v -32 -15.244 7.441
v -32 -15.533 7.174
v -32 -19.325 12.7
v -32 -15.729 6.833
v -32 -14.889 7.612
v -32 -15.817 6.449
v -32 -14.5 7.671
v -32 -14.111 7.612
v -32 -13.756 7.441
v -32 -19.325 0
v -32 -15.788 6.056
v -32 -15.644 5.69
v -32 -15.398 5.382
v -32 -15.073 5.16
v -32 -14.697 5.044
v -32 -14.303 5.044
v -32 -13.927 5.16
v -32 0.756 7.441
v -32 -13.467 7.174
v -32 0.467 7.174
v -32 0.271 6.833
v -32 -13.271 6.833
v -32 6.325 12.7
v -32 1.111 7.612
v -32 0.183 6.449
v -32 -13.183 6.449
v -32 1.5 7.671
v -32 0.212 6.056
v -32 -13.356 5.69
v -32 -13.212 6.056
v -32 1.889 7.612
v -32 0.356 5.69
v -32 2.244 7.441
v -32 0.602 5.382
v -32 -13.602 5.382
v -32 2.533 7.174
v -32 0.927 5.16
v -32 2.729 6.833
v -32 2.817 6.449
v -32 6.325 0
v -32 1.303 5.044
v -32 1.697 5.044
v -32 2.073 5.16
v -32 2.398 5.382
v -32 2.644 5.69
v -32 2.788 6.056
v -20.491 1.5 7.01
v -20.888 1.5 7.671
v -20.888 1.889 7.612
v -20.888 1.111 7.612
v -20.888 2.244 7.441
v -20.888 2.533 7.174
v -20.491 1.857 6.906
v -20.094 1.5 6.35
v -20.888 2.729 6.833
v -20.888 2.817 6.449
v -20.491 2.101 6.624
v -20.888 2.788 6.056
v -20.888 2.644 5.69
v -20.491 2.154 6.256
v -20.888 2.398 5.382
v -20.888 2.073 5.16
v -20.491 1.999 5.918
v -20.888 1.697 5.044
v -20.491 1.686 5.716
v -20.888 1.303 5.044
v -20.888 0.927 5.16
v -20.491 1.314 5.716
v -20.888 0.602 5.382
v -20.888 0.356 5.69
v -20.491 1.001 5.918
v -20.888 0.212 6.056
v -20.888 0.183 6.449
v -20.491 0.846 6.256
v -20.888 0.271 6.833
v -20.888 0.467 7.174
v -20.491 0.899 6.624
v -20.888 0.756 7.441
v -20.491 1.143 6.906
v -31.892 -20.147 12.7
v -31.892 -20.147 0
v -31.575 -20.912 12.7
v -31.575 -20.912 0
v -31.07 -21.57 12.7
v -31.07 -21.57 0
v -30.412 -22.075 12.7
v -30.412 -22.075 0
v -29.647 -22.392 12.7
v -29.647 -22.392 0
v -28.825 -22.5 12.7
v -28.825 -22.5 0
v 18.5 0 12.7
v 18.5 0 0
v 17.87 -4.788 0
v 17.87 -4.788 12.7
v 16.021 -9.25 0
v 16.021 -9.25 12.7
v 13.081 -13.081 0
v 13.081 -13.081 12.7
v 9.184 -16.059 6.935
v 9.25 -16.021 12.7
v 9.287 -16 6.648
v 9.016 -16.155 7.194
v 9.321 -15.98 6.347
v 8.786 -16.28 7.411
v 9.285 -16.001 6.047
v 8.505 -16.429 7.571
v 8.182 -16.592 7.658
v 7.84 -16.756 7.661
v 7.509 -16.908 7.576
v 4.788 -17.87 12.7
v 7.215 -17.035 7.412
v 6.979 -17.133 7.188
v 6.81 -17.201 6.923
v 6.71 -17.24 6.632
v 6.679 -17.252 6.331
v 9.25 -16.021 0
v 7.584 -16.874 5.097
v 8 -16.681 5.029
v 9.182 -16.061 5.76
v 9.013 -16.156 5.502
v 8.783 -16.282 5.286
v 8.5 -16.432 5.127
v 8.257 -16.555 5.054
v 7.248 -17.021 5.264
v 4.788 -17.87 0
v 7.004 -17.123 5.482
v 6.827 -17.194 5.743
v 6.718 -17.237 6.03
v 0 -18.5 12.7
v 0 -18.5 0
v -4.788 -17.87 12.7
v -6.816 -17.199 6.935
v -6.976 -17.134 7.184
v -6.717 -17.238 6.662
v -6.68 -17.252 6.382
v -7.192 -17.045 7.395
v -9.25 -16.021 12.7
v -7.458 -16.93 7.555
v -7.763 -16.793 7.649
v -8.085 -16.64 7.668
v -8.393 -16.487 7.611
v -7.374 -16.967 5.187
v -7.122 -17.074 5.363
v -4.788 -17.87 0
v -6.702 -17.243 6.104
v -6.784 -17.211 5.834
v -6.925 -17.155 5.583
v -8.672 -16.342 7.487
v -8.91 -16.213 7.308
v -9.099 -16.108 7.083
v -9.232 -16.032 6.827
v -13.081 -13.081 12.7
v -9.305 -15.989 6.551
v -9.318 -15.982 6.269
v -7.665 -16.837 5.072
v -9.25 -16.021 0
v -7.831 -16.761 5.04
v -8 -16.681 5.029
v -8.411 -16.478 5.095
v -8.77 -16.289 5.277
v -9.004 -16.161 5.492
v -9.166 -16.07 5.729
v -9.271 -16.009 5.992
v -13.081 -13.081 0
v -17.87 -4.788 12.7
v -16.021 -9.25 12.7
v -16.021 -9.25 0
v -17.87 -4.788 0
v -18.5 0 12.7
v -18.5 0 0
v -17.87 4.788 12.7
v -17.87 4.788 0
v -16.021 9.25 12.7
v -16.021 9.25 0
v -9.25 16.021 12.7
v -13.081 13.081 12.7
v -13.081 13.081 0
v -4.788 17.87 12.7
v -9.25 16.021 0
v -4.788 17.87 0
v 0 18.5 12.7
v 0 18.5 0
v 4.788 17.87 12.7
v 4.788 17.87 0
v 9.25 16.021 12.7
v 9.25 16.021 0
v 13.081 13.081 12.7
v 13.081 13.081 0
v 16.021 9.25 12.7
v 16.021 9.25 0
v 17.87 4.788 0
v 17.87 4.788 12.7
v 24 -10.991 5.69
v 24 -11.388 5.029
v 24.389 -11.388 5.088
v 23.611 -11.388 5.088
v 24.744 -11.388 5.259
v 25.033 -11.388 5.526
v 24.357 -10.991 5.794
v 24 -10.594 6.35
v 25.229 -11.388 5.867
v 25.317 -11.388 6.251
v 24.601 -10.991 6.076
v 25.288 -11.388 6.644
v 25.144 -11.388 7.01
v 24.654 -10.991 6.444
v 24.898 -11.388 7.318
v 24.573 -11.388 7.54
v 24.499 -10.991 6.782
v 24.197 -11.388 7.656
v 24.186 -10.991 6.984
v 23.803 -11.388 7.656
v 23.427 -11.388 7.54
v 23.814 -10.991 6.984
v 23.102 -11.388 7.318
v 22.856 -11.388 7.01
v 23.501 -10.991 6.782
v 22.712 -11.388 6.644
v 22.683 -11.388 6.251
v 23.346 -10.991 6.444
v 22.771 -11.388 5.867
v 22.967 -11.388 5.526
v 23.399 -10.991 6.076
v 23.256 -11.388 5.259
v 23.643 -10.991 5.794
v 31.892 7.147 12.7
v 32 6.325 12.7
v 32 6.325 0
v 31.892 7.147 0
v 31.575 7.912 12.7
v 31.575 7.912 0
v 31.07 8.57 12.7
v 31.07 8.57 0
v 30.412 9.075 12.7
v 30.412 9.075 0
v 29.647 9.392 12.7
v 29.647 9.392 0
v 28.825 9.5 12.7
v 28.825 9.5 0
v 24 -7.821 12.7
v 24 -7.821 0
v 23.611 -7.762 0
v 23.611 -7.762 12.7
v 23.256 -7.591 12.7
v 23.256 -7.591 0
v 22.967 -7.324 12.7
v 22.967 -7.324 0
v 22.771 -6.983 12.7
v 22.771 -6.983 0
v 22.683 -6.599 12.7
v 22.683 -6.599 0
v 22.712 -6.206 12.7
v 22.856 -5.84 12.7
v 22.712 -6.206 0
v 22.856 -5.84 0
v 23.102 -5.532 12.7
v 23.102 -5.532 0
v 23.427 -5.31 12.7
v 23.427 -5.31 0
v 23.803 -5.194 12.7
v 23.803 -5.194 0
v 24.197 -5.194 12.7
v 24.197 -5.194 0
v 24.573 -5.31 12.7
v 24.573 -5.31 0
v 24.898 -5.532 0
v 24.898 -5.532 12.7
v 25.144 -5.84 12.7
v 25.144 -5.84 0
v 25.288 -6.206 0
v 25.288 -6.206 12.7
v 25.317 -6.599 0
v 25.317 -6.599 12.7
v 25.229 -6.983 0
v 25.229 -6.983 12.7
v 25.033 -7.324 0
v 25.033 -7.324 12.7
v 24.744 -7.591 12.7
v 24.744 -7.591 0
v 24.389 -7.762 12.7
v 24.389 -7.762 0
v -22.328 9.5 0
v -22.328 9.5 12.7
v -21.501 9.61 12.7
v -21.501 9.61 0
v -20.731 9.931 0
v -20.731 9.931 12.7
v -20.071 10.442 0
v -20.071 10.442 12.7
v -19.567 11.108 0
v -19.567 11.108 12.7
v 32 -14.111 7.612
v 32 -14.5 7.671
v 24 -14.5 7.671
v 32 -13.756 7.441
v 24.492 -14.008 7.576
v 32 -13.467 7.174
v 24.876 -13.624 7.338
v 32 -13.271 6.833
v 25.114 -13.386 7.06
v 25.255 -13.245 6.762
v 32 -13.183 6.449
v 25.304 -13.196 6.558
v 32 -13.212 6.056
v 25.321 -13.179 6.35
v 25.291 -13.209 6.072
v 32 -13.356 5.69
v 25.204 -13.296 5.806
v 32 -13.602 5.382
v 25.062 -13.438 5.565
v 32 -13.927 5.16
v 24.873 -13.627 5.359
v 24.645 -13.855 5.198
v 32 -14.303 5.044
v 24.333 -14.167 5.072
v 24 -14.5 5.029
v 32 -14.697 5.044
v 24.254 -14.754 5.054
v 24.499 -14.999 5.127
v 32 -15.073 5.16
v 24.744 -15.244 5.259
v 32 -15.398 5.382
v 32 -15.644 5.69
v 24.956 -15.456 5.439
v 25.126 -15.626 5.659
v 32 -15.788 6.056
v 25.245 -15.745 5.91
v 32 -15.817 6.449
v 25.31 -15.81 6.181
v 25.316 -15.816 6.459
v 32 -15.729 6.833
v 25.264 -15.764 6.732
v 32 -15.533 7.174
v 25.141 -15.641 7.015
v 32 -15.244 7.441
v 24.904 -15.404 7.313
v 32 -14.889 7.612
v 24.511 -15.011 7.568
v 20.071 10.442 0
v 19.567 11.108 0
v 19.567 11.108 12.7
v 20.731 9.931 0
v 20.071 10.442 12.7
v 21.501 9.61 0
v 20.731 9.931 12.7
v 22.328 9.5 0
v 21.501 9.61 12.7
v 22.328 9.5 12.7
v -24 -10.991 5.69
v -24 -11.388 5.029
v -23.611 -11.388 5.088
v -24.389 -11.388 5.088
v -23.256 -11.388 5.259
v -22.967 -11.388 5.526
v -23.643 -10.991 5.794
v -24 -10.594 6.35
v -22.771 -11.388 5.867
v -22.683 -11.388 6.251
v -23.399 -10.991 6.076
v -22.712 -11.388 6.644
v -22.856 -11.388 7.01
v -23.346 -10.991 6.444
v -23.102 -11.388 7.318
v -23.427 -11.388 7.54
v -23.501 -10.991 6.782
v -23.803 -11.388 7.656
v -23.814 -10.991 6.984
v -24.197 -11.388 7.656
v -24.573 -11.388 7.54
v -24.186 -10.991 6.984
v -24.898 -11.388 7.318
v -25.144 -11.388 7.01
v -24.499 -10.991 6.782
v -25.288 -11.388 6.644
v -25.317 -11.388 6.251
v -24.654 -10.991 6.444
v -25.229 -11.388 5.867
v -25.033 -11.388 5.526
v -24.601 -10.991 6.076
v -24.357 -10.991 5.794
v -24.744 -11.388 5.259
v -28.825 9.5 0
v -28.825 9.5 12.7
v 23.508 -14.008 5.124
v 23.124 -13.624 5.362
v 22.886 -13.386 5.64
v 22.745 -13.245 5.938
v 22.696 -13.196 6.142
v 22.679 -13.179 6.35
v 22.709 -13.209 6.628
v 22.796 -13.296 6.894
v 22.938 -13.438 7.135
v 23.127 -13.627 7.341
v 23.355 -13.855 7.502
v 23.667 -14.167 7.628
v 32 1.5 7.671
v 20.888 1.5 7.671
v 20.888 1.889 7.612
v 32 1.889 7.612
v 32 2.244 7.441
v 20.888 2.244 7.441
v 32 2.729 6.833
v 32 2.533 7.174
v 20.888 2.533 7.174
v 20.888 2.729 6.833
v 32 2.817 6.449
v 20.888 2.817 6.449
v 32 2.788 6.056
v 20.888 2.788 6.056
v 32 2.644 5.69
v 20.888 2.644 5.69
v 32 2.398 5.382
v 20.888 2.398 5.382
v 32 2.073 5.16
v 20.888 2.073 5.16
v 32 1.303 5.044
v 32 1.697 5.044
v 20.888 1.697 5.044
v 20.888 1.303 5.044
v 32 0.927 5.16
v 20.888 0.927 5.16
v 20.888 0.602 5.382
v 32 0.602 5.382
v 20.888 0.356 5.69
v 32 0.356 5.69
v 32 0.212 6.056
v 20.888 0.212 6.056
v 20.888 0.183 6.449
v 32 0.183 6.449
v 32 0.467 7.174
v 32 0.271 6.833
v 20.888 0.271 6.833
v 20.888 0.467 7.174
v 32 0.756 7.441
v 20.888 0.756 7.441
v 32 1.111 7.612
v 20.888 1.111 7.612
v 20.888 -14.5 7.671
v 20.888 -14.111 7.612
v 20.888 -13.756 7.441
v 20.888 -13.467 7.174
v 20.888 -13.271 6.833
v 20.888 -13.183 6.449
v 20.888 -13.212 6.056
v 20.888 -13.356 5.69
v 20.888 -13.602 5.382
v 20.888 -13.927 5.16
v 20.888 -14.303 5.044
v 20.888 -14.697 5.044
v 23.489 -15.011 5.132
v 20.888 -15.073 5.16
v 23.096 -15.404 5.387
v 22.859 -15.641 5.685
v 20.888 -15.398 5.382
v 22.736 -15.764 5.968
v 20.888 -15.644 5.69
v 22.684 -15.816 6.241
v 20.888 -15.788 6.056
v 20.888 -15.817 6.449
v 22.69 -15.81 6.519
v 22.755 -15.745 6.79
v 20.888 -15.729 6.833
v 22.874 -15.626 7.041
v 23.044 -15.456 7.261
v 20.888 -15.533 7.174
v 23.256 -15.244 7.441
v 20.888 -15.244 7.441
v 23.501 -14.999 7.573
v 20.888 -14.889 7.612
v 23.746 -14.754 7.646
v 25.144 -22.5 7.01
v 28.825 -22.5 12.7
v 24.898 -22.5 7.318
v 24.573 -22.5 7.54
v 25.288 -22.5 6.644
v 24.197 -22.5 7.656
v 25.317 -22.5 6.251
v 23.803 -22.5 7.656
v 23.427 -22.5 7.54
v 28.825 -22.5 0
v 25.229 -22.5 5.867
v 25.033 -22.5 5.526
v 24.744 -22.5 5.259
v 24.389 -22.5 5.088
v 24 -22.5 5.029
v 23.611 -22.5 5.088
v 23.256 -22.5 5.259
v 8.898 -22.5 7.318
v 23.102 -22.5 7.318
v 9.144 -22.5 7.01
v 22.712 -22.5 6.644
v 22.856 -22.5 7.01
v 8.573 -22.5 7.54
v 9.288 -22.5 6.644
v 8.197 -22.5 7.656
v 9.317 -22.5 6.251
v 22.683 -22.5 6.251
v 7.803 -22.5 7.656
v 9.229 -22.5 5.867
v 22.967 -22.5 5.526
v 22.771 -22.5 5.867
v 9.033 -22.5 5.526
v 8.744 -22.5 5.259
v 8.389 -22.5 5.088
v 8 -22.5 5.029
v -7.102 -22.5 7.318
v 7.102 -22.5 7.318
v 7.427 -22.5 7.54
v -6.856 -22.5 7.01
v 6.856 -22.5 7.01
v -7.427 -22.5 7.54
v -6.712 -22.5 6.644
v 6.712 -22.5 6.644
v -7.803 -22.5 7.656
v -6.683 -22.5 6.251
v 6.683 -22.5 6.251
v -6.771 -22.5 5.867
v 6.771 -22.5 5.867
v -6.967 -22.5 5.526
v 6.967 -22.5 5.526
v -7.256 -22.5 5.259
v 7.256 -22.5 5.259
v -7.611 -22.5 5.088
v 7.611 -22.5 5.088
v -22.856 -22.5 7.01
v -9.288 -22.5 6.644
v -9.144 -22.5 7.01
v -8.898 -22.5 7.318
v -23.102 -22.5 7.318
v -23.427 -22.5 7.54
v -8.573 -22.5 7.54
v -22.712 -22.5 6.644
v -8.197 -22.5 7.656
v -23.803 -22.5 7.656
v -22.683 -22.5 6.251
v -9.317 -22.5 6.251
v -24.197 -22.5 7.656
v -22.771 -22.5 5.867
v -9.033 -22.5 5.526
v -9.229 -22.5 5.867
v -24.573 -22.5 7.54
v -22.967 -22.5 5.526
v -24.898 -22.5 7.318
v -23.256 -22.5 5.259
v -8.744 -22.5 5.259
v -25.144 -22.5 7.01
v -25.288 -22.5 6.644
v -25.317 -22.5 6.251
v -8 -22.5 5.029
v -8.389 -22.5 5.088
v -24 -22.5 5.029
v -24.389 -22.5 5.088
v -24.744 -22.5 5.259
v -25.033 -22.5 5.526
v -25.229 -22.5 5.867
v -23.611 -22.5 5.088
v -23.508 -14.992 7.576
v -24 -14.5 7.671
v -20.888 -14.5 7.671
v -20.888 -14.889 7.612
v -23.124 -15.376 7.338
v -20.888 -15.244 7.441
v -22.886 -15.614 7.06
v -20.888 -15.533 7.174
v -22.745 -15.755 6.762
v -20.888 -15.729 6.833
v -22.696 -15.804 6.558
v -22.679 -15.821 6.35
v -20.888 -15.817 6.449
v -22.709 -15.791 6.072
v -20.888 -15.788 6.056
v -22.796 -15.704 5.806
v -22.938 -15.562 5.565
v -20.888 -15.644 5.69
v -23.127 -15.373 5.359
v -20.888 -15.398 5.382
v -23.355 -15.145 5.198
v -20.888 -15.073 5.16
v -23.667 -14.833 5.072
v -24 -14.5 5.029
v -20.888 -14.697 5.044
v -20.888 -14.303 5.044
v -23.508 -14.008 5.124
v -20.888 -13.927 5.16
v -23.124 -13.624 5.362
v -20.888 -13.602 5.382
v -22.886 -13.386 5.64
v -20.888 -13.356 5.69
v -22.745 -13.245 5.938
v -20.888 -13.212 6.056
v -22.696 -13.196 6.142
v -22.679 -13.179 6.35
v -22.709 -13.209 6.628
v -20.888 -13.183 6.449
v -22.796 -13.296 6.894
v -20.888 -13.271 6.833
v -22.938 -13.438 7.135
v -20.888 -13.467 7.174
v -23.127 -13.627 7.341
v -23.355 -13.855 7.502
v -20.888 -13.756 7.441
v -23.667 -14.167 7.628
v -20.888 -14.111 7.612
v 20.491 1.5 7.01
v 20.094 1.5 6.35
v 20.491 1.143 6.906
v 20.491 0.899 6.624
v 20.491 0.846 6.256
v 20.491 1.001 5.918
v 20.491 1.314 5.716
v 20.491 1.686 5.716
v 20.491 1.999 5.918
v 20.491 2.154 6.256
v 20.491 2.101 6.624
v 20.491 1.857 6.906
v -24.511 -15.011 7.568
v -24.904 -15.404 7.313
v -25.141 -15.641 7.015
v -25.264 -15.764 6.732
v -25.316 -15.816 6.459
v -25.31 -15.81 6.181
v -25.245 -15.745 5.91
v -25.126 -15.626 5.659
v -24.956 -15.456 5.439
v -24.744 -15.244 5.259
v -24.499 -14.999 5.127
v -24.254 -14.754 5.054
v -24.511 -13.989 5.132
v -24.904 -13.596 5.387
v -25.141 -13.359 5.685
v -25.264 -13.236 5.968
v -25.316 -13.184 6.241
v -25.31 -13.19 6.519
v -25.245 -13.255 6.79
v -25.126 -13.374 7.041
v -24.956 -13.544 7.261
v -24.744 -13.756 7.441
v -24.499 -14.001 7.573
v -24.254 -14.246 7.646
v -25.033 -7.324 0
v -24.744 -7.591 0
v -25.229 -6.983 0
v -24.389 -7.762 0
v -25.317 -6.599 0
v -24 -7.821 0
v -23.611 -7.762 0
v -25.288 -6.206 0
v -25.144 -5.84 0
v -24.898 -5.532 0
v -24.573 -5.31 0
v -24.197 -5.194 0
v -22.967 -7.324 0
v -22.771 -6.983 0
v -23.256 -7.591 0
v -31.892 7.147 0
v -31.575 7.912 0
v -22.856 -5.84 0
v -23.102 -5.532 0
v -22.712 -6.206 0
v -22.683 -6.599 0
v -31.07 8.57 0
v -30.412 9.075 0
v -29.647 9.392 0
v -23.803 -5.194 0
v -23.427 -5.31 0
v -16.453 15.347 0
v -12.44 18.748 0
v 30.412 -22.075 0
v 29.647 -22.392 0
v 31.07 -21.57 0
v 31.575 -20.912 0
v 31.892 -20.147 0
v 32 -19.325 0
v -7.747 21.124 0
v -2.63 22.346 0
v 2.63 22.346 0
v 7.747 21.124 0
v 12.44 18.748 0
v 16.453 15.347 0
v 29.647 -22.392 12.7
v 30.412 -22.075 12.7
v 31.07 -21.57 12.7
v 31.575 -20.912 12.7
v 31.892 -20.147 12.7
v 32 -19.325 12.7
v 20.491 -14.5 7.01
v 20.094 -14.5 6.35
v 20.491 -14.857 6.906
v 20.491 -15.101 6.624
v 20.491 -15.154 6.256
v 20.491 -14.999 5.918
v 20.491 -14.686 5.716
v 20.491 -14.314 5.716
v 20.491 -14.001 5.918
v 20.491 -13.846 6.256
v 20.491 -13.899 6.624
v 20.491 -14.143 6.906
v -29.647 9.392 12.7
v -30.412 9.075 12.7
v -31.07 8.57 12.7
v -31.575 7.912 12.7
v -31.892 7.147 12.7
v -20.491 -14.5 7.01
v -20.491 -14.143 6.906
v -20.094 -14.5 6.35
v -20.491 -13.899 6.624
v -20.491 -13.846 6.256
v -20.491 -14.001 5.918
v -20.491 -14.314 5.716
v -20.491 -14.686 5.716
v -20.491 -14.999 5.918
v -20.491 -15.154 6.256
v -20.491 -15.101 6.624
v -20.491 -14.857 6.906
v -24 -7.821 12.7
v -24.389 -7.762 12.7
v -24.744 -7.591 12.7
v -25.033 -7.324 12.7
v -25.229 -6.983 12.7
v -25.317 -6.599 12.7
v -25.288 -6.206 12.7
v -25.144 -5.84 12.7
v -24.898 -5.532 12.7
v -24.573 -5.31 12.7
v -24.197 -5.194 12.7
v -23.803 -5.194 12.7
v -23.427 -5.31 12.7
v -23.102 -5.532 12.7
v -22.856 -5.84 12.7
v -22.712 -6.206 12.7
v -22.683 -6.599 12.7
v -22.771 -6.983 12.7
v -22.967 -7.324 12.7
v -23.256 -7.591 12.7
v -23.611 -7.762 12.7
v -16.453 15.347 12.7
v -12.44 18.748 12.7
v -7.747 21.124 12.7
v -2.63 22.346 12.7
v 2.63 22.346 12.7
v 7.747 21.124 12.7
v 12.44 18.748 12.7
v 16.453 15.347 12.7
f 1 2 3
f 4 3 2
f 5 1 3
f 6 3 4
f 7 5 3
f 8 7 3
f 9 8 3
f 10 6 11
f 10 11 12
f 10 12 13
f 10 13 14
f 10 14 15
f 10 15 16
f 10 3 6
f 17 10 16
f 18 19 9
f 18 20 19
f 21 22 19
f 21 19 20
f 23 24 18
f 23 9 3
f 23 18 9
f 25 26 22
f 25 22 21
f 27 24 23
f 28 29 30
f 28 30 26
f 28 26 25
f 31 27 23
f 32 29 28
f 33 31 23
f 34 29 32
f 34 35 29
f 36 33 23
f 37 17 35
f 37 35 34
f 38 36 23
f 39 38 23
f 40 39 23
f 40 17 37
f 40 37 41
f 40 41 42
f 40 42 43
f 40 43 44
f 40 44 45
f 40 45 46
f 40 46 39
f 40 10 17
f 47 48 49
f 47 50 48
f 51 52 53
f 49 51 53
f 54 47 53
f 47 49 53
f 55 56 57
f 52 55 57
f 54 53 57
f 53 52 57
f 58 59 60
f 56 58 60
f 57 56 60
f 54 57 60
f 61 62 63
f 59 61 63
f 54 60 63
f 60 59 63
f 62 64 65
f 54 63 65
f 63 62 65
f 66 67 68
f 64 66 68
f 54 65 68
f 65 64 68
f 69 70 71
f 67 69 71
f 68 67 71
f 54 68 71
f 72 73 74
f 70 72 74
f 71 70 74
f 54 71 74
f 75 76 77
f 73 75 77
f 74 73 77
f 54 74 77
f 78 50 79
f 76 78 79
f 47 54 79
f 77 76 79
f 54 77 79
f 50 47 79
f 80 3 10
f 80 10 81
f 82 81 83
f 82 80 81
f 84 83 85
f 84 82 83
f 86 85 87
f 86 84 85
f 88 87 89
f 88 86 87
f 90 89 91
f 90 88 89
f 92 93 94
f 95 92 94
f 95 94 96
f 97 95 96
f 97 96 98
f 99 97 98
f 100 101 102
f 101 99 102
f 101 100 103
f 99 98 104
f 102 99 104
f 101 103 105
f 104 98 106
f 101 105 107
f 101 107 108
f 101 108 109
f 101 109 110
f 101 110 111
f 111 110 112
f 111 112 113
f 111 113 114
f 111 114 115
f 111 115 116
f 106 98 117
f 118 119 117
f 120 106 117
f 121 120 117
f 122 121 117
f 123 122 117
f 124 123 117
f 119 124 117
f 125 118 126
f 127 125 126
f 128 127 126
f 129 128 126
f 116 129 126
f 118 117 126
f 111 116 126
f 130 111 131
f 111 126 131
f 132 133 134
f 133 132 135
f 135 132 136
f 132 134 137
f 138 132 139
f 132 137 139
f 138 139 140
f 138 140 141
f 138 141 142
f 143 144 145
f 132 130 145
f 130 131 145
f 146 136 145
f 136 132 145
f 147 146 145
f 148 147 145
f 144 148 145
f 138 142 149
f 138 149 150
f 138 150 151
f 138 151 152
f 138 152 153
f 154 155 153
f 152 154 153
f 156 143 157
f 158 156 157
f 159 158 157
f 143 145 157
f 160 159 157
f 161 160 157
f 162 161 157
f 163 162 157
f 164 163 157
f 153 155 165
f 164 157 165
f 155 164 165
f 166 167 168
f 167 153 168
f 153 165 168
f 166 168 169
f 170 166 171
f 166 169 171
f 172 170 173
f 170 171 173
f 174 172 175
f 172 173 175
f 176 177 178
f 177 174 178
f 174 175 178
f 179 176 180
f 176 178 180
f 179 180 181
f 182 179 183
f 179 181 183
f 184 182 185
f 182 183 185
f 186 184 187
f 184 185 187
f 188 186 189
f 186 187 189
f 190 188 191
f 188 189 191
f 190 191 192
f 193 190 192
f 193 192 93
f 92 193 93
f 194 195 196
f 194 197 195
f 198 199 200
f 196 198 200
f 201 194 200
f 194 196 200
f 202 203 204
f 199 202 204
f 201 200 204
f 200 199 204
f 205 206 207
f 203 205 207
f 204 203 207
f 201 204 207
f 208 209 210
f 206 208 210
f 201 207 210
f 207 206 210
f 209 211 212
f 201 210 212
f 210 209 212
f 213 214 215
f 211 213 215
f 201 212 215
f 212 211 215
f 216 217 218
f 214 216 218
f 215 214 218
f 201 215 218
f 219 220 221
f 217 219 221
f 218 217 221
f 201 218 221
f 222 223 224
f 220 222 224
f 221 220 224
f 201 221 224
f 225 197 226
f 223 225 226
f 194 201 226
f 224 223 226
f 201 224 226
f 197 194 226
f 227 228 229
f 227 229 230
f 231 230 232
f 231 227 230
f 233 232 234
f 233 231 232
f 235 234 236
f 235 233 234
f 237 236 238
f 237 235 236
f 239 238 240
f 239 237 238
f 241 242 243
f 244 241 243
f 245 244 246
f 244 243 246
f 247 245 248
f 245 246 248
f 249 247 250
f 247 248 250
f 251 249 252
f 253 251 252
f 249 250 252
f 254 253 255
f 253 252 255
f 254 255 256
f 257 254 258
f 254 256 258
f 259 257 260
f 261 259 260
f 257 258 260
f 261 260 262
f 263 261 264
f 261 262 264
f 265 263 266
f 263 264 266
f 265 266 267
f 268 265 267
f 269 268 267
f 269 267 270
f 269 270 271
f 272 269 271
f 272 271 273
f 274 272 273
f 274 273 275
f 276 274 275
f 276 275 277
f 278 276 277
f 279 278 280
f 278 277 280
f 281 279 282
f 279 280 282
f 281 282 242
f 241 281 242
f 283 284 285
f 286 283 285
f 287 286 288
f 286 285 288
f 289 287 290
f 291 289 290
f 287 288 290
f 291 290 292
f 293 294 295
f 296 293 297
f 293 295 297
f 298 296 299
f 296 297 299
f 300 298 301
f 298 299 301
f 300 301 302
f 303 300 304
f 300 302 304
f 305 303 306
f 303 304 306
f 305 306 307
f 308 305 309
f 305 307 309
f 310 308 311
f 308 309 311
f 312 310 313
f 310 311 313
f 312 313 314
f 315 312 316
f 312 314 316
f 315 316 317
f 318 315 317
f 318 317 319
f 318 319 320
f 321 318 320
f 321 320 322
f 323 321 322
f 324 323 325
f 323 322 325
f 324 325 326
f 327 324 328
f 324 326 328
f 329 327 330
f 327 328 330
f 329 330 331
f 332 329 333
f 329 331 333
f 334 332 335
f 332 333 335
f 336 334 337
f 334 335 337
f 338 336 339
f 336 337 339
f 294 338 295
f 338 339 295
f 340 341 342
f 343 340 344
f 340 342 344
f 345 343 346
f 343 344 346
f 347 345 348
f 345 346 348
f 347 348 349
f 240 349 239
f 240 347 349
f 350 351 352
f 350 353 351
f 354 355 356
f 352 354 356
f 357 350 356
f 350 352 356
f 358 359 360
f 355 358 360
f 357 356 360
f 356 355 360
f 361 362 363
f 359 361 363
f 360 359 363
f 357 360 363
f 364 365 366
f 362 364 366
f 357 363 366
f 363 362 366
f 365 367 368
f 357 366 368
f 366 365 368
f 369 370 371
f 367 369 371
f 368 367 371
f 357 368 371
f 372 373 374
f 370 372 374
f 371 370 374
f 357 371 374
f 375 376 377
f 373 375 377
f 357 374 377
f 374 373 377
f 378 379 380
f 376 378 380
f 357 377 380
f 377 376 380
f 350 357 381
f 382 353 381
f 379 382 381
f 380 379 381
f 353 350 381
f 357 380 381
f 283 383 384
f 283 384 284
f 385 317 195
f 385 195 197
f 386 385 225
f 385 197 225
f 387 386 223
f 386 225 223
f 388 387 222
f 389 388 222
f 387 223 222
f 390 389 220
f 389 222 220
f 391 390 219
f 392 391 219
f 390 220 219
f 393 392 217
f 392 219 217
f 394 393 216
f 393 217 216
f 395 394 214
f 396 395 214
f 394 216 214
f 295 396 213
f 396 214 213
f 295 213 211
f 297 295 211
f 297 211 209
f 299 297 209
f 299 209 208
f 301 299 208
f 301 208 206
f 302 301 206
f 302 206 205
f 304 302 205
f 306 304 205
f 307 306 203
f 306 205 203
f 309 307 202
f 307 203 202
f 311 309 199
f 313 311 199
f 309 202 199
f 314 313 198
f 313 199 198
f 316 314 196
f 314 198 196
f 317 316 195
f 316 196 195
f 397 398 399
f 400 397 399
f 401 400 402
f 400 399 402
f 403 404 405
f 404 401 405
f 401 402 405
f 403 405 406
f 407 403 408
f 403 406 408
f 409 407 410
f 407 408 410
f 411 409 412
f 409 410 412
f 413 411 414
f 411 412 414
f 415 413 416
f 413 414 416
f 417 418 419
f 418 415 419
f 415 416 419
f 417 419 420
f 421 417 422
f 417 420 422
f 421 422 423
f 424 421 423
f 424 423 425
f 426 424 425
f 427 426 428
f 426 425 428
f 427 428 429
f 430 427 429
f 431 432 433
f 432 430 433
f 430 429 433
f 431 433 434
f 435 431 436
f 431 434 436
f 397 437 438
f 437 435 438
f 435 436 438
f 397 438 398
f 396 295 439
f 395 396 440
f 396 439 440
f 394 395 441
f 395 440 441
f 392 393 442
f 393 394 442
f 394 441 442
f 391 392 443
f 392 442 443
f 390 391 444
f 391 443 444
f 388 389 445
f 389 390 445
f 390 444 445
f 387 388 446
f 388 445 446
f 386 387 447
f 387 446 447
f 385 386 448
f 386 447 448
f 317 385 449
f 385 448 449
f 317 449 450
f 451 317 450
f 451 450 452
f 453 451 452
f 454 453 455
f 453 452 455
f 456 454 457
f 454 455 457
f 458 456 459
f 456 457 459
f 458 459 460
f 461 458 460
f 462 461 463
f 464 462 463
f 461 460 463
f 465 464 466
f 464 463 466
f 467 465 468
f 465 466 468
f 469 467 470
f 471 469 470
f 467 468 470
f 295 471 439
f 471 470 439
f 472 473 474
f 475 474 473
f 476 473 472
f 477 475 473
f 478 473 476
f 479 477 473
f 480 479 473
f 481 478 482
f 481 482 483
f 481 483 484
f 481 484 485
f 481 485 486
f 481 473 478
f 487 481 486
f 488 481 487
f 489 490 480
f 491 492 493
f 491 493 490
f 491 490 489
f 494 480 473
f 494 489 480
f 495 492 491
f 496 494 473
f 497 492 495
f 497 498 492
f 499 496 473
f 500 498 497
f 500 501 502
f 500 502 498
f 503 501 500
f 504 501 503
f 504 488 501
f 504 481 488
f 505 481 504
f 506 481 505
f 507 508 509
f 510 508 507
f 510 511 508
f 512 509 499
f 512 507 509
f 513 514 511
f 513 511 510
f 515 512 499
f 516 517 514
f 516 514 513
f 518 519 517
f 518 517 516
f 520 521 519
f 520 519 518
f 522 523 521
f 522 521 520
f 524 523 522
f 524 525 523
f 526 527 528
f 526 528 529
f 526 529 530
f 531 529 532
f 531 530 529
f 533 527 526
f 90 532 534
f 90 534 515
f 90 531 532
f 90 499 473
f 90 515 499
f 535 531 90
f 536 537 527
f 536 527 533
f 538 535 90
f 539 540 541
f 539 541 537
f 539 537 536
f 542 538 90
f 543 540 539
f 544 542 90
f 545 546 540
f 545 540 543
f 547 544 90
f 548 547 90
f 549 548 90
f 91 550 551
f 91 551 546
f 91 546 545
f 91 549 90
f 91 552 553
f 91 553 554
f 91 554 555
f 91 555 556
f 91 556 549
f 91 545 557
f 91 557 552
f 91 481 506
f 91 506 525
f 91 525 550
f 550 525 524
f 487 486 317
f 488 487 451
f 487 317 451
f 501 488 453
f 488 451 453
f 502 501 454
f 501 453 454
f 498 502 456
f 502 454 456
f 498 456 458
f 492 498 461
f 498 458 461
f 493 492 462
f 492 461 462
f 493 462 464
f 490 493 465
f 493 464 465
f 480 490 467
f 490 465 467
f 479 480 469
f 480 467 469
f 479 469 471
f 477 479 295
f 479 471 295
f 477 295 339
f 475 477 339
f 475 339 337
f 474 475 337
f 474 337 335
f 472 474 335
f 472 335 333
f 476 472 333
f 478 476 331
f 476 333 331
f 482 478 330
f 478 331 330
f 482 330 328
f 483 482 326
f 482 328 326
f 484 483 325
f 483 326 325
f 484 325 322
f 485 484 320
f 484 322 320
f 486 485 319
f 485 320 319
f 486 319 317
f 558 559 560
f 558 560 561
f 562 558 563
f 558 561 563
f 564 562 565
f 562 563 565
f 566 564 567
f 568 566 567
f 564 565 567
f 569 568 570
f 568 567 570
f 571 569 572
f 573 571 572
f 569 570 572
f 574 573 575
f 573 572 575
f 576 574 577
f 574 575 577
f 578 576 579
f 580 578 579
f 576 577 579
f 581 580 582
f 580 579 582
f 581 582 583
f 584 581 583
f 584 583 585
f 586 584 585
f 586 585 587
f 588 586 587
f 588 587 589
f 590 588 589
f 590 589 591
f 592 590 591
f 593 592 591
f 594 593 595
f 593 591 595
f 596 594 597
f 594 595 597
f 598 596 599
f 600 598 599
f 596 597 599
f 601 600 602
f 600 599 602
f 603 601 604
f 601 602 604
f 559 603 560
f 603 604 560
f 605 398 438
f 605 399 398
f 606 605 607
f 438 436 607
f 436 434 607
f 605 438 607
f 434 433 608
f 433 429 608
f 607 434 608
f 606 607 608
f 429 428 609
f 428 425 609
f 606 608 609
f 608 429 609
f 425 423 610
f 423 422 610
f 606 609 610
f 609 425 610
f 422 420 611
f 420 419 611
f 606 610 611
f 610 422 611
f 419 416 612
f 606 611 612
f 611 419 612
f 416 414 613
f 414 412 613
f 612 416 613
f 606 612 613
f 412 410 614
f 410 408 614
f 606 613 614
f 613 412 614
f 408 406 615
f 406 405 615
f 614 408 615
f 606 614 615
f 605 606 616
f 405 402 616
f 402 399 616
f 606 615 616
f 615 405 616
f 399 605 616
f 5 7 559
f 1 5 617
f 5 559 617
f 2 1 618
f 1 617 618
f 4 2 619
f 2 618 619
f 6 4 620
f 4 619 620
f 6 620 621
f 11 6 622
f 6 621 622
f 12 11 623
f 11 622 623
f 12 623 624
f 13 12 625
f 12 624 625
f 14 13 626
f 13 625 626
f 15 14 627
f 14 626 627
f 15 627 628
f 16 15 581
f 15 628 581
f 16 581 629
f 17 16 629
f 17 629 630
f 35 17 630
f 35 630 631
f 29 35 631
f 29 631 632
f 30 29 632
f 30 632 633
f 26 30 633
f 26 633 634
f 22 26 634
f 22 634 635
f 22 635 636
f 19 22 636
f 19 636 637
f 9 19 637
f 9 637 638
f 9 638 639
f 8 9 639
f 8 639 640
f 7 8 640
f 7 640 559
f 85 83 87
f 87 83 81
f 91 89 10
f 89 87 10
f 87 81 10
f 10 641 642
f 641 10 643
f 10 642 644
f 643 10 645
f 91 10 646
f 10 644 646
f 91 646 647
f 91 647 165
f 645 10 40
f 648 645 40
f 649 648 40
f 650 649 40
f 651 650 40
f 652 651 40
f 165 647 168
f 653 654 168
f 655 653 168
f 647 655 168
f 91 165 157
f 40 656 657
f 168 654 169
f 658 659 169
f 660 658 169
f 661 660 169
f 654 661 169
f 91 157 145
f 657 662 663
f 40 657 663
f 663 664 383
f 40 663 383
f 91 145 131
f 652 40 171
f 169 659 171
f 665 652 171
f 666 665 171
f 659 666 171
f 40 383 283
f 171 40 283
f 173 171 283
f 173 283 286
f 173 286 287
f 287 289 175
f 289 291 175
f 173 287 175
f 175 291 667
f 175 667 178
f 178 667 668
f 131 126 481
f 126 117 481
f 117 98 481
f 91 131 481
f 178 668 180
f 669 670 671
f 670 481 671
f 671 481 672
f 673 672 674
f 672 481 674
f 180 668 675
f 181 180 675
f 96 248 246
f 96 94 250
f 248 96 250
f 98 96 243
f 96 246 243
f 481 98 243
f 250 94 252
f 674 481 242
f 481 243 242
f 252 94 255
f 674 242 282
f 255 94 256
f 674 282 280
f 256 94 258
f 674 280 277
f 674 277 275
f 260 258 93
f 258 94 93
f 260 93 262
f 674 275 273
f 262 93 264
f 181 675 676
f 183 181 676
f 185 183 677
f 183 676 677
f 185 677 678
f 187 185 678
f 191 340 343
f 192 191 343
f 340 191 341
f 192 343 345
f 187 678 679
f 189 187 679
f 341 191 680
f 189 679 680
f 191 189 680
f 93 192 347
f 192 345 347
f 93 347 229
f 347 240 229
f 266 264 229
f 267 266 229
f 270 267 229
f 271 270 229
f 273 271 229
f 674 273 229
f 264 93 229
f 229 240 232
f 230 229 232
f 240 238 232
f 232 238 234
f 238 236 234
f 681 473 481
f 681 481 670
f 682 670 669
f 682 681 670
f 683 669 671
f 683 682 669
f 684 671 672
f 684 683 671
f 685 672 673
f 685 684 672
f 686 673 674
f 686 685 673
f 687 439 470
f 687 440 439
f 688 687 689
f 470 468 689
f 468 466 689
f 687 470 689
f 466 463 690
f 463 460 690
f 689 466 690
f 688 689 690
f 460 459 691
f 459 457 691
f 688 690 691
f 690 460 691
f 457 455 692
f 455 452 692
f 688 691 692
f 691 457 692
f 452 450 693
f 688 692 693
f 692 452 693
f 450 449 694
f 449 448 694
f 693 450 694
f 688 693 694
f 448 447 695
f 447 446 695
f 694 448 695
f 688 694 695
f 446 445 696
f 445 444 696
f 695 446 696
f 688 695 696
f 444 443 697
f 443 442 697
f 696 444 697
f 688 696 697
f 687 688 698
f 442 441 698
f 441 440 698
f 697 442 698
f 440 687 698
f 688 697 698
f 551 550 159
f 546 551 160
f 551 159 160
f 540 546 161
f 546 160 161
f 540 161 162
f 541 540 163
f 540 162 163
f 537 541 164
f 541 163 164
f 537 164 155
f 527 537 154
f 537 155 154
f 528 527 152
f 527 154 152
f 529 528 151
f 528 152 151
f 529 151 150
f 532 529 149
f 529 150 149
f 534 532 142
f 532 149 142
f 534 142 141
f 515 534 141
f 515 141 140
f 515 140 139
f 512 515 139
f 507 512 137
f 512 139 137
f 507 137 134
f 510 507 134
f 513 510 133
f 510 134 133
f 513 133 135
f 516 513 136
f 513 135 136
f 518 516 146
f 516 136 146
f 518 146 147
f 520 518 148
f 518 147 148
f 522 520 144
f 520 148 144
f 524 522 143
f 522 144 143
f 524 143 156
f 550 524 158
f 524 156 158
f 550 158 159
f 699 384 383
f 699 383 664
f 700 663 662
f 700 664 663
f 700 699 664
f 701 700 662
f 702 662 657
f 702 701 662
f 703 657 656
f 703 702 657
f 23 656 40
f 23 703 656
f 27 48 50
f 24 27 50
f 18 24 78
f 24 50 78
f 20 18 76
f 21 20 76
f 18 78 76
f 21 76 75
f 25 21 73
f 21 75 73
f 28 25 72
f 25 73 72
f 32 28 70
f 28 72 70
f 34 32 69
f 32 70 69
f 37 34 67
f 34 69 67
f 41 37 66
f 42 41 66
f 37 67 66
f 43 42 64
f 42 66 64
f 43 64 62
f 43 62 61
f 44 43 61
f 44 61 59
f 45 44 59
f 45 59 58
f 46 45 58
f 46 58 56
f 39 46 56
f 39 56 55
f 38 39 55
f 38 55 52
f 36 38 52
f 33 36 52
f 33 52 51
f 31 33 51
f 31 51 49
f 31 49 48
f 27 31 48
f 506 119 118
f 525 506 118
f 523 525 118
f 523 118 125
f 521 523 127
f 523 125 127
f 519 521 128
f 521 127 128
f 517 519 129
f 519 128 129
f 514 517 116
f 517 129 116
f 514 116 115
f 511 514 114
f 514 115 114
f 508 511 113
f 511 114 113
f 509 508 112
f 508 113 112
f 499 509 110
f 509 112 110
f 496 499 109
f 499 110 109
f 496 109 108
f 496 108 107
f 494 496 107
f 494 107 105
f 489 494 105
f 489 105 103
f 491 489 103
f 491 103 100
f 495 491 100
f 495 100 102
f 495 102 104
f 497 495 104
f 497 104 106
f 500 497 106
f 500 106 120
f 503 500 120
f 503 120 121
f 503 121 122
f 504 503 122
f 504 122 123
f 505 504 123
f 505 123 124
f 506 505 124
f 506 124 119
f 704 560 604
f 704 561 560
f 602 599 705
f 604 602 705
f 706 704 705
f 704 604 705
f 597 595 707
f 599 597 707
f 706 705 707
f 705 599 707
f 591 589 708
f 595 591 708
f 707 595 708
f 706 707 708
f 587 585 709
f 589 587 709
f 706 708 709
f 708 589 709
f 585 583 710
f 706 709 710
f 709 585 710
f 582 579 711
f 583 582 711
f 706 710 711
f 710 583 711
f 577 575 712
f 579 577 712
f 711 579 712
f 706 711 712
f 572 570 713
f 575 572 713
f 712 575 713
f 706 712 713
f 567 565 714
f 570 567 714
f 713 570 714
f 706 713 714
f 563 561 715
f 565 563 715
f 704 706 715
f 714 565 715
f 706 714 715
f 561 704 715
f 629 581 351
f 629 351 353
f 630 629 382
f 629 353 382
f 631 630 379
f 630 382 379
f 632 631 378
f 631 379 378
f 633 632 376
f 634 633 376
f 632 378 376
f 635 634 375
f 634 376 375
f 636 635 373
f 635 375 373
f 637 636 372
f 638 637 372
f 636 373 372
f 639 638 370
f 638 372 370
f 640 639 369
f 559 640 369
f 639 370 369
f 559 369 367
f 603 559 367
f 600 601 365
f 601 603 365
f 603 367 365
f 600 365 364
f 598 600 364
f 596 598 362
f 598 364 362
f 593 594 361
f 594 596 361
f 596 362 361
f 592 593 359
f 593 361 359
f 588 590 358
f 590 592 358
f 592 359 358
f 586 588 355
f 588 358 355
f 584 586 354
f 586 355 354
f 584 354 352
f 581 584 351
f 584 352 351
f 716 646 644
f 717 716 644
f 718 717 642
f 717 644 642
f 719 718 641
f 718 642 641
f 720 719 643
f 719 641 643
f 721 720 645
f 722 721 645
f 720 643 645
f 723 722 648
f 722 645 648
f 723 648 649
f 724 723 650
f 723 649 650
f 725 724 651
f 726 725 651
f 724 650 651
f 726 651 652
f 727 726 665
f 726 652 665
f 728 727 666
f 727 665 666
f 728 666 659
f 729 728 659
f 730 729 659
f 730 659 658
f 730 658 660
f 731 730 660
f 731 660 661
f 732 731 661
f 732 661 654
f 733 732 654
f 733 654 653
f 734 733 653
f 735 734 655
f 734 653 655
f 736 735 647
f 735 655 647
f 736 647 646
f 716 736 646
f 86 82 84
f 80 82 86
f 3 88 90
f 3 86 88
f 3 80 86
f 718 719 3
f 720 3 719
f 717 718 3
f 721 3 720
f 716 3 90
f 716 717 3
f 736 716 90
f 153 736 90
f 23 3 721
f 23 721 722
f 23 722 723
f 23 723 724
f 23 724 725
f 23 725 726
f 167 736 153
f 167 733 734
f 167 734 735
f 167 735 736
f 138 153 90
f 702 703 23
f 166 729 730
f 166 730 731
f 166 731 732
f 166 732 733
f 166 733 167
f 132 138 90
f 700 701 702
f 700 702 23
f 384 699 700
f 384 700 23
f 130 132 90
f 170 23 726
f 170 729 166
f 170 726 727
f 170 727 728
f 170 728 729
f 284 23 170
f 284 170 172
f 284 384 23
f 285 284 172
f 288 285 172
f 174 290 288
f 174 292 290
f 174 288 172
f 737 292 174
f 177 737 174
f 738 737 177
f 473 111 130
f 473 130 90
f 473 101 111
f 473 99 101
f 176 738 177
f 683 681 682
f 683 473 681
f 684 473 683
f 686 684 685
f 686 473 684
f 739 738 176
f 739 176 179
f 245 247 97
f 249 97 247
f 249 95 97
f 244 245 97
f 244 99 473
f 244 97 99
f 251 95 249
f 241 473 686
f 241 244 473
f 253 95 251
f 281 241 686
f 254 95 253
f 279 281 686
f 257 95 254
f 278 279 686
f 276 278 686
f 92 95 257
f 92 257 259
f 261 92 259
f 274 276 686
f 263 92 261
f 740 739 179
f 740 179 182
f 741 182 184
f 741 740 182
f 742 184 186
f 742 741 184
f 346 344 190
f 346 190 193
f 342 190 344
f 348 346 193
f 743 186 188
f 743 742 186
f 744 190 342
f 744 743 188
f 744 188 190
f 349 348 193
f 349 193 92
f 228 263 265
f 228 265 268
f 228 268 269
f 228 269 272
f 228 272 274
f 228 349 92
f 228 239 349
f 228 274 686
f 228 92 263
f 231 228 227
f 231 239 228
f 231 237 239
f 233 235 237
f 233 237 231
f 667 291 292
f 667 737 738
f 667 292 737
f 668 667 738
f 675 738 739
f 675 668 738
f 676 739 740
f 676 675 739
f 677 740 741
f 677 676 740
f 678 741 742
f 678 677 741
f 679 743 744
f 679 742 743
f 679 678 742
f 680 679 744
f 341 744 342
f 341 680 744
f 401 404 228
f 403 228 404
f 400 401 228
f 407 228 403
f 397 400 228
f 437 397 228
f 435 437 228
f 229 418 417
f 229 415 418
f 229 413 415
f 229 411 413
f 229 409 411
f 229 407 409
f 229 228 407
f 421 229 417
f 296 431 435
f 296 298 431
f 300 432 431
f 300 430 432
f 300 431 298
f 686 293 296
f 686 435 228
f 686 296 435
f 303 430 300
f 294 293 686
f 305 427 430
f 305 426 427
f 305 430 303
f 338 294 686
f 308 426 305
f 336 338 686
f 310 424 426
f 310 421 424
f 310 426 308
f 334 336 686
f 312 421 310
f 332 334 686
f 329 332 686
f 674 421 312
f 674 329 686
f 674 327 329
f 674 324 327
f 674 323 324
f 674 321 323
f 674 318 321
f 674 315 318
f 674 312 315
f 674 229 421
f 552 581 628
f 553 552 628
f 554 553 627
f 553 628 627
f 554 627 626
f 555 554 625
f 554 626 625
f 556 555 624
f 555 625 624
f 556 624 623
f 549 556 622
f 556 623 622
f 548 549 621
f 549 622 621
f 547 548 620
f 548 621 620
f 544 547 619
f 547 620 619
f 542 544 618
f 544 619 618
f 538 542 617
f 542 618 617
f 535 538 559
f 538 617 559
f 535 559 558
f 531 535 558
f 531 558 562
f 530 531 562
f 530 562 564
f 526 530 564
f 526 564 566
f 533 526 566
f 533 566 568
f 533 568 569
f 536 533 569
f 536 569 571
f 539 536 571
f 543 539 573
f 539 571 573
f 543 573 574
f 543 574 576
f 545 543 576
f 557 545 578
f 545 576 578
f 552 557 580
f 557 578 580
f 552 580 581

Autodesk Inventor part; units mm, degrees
ref_plane "YZ Plane" through (0, 0, 0) normal (1, 0, 0) x (0, 1, 0)
ref_plane "XZ Plane" through (0, 0, 0) normal (0, 1, 0) x (-1, 0, 0)
ref_plane "XY Plane" through (0, 0, 0) normal (0, 0, 1) x (1, 0, 0)
sketch "Sketch1" plane through (0, 0, 0) normal (0, 0, 1) x (1, 0, 0)
  circle A0 centre (0, 0) radius 18.5
  line L0 (32, 9.5) -> (32, -22.5)
  line L1 (32, -22.5) -> (-32, -22.5)
  line L2 (-32, -22.5) -> (-32, 9.5)
  arc A1 (20.3961, 9.5) -> (-20.3961, 9.5) centre (0, 0) ccw
  line L3 (-32, 9.5) -> (-20.3961, 9.5)
  line L4 (20.3961, 9.5) -> (32, 9.5)
  point P0 (0, -22.5)
  dimension "d0" = 37
  dimension "d1" = 22.5
  dimension "d2" = 64
  dimension "d3" = 22.5
  dimension "d4" = 32
extrude "Extrusion1" add sketch "Sketch1" along normal blind 12.7
fillet "Fillet1" radius 3.175 6 edges at (32, 9.5, 6.35) (20.3961, 9.5, 6.35) (-20.3961, 9.5, 6.35) (-32, 9.5, 6.35) (-32, -22.5, 6.35) (32, -22.5, 6.35)
sketch "Sketch2" plane through (-32, -19.325, 0) normal (-1, 0, 0) x (0, 0, 1)
  line L0 (12.7, -3.175) -> (0, -3.175) projected
  line L1 (0, -3.175) -> (12.7, -3.175) projected
  point P0 (0, 19.325)
  point P1 (6.35, 20.825)
  point P2 (6.35, 4.825)
  point P3 (6.35, 0)
  dimension "d8" = 16
  dimension "d11" = 8
hole "Hole1" at (-32, 1.5, 6.35) at (-32, -14.5, 6.35) direction (1, 0, 0) diameter 2.6416 depth 11.1125 tip angle 118 thread size "6-32 UNC" class "2B" standard "ANSI Unified Screw Threads"
sketch "Sketch4" plane through (-28.825, -22.5, 0) normal (0, -1, 0) x (1, 0, 0)
  line L0 (-3.175, 5.0292) -> (-3.175, 7.6708) projected
  line L1 (-3.175, 5.0292) -> (-3.175, 7.6708) projected
  line L2 (-3.175, 12.7) -> (-3.175, 0) projected
  line L3 (-3.175, 0) -> (-3.175, 12.7) projected
  circle A0 centre (28.825, 6.35) radius 8 construction
  point P0 (20.825, 6.35)
  point P1 (36.825, 6.35)
  point P2 (-3.175, 6.35)
  point P3 (-3.175, 6.35)
  point P4 (-3.175, 6.35)
  point P5 (4.825, 6.35)
  point P6 (52.825, 6.35)
  point P7 (-3.175, 6.35)
  dimension "d24" = 16
  dimension "d19" = 16
  dimension "d23" = 32
  dimension "d43" = 16
  dimension "d44" = 16
hole "Hole2" at (-8, -22.5, 6.35) at (8, -22.5, 6.35) at (24, -22.5, 6.35) at (-24, -22.5, 6.35) direction (0, 1, 0) diameter 2.6416 depth 11.1125 tip angle 118 thread size "6-32 UNC" class "2B" standard "ANSI Unified Screw Threads"
mirror "Mirror1" about plane through (0, 0, 0) normal (1, 0, 0) of "Hole1"
sketch "Sketch5" plane through (0, 0, 12.7) normal (0, 0, 1) x (1, 0, 0)
  arc A0 (19.5671, 11.1076) -> (-19.5671, 11.1076) centre (0, 0) ccw projected
  line L0 (-28.825, -22.5) -> (28.825, -22.5) projected
  point P0 (-24, -6.5)
  point P1 (24, -6.5)
  dimension "d32" = 48
  dimension "d34" = 24
  dimension "d35" = 16
hole "Hole3" at (-24, -6.5, 12.7) at (24, -6.5, 12.7) direction (0, 0, -1) diameter 2.6416 end through all thread size "6-32 UNC" class "2B" standard "ANSI Unified Screw Threads"
equation "\"d34\" = 0.5 * d32"
properties part number "Motor Mount New - Estimated Dimensions" material "Aluminum 6061"
